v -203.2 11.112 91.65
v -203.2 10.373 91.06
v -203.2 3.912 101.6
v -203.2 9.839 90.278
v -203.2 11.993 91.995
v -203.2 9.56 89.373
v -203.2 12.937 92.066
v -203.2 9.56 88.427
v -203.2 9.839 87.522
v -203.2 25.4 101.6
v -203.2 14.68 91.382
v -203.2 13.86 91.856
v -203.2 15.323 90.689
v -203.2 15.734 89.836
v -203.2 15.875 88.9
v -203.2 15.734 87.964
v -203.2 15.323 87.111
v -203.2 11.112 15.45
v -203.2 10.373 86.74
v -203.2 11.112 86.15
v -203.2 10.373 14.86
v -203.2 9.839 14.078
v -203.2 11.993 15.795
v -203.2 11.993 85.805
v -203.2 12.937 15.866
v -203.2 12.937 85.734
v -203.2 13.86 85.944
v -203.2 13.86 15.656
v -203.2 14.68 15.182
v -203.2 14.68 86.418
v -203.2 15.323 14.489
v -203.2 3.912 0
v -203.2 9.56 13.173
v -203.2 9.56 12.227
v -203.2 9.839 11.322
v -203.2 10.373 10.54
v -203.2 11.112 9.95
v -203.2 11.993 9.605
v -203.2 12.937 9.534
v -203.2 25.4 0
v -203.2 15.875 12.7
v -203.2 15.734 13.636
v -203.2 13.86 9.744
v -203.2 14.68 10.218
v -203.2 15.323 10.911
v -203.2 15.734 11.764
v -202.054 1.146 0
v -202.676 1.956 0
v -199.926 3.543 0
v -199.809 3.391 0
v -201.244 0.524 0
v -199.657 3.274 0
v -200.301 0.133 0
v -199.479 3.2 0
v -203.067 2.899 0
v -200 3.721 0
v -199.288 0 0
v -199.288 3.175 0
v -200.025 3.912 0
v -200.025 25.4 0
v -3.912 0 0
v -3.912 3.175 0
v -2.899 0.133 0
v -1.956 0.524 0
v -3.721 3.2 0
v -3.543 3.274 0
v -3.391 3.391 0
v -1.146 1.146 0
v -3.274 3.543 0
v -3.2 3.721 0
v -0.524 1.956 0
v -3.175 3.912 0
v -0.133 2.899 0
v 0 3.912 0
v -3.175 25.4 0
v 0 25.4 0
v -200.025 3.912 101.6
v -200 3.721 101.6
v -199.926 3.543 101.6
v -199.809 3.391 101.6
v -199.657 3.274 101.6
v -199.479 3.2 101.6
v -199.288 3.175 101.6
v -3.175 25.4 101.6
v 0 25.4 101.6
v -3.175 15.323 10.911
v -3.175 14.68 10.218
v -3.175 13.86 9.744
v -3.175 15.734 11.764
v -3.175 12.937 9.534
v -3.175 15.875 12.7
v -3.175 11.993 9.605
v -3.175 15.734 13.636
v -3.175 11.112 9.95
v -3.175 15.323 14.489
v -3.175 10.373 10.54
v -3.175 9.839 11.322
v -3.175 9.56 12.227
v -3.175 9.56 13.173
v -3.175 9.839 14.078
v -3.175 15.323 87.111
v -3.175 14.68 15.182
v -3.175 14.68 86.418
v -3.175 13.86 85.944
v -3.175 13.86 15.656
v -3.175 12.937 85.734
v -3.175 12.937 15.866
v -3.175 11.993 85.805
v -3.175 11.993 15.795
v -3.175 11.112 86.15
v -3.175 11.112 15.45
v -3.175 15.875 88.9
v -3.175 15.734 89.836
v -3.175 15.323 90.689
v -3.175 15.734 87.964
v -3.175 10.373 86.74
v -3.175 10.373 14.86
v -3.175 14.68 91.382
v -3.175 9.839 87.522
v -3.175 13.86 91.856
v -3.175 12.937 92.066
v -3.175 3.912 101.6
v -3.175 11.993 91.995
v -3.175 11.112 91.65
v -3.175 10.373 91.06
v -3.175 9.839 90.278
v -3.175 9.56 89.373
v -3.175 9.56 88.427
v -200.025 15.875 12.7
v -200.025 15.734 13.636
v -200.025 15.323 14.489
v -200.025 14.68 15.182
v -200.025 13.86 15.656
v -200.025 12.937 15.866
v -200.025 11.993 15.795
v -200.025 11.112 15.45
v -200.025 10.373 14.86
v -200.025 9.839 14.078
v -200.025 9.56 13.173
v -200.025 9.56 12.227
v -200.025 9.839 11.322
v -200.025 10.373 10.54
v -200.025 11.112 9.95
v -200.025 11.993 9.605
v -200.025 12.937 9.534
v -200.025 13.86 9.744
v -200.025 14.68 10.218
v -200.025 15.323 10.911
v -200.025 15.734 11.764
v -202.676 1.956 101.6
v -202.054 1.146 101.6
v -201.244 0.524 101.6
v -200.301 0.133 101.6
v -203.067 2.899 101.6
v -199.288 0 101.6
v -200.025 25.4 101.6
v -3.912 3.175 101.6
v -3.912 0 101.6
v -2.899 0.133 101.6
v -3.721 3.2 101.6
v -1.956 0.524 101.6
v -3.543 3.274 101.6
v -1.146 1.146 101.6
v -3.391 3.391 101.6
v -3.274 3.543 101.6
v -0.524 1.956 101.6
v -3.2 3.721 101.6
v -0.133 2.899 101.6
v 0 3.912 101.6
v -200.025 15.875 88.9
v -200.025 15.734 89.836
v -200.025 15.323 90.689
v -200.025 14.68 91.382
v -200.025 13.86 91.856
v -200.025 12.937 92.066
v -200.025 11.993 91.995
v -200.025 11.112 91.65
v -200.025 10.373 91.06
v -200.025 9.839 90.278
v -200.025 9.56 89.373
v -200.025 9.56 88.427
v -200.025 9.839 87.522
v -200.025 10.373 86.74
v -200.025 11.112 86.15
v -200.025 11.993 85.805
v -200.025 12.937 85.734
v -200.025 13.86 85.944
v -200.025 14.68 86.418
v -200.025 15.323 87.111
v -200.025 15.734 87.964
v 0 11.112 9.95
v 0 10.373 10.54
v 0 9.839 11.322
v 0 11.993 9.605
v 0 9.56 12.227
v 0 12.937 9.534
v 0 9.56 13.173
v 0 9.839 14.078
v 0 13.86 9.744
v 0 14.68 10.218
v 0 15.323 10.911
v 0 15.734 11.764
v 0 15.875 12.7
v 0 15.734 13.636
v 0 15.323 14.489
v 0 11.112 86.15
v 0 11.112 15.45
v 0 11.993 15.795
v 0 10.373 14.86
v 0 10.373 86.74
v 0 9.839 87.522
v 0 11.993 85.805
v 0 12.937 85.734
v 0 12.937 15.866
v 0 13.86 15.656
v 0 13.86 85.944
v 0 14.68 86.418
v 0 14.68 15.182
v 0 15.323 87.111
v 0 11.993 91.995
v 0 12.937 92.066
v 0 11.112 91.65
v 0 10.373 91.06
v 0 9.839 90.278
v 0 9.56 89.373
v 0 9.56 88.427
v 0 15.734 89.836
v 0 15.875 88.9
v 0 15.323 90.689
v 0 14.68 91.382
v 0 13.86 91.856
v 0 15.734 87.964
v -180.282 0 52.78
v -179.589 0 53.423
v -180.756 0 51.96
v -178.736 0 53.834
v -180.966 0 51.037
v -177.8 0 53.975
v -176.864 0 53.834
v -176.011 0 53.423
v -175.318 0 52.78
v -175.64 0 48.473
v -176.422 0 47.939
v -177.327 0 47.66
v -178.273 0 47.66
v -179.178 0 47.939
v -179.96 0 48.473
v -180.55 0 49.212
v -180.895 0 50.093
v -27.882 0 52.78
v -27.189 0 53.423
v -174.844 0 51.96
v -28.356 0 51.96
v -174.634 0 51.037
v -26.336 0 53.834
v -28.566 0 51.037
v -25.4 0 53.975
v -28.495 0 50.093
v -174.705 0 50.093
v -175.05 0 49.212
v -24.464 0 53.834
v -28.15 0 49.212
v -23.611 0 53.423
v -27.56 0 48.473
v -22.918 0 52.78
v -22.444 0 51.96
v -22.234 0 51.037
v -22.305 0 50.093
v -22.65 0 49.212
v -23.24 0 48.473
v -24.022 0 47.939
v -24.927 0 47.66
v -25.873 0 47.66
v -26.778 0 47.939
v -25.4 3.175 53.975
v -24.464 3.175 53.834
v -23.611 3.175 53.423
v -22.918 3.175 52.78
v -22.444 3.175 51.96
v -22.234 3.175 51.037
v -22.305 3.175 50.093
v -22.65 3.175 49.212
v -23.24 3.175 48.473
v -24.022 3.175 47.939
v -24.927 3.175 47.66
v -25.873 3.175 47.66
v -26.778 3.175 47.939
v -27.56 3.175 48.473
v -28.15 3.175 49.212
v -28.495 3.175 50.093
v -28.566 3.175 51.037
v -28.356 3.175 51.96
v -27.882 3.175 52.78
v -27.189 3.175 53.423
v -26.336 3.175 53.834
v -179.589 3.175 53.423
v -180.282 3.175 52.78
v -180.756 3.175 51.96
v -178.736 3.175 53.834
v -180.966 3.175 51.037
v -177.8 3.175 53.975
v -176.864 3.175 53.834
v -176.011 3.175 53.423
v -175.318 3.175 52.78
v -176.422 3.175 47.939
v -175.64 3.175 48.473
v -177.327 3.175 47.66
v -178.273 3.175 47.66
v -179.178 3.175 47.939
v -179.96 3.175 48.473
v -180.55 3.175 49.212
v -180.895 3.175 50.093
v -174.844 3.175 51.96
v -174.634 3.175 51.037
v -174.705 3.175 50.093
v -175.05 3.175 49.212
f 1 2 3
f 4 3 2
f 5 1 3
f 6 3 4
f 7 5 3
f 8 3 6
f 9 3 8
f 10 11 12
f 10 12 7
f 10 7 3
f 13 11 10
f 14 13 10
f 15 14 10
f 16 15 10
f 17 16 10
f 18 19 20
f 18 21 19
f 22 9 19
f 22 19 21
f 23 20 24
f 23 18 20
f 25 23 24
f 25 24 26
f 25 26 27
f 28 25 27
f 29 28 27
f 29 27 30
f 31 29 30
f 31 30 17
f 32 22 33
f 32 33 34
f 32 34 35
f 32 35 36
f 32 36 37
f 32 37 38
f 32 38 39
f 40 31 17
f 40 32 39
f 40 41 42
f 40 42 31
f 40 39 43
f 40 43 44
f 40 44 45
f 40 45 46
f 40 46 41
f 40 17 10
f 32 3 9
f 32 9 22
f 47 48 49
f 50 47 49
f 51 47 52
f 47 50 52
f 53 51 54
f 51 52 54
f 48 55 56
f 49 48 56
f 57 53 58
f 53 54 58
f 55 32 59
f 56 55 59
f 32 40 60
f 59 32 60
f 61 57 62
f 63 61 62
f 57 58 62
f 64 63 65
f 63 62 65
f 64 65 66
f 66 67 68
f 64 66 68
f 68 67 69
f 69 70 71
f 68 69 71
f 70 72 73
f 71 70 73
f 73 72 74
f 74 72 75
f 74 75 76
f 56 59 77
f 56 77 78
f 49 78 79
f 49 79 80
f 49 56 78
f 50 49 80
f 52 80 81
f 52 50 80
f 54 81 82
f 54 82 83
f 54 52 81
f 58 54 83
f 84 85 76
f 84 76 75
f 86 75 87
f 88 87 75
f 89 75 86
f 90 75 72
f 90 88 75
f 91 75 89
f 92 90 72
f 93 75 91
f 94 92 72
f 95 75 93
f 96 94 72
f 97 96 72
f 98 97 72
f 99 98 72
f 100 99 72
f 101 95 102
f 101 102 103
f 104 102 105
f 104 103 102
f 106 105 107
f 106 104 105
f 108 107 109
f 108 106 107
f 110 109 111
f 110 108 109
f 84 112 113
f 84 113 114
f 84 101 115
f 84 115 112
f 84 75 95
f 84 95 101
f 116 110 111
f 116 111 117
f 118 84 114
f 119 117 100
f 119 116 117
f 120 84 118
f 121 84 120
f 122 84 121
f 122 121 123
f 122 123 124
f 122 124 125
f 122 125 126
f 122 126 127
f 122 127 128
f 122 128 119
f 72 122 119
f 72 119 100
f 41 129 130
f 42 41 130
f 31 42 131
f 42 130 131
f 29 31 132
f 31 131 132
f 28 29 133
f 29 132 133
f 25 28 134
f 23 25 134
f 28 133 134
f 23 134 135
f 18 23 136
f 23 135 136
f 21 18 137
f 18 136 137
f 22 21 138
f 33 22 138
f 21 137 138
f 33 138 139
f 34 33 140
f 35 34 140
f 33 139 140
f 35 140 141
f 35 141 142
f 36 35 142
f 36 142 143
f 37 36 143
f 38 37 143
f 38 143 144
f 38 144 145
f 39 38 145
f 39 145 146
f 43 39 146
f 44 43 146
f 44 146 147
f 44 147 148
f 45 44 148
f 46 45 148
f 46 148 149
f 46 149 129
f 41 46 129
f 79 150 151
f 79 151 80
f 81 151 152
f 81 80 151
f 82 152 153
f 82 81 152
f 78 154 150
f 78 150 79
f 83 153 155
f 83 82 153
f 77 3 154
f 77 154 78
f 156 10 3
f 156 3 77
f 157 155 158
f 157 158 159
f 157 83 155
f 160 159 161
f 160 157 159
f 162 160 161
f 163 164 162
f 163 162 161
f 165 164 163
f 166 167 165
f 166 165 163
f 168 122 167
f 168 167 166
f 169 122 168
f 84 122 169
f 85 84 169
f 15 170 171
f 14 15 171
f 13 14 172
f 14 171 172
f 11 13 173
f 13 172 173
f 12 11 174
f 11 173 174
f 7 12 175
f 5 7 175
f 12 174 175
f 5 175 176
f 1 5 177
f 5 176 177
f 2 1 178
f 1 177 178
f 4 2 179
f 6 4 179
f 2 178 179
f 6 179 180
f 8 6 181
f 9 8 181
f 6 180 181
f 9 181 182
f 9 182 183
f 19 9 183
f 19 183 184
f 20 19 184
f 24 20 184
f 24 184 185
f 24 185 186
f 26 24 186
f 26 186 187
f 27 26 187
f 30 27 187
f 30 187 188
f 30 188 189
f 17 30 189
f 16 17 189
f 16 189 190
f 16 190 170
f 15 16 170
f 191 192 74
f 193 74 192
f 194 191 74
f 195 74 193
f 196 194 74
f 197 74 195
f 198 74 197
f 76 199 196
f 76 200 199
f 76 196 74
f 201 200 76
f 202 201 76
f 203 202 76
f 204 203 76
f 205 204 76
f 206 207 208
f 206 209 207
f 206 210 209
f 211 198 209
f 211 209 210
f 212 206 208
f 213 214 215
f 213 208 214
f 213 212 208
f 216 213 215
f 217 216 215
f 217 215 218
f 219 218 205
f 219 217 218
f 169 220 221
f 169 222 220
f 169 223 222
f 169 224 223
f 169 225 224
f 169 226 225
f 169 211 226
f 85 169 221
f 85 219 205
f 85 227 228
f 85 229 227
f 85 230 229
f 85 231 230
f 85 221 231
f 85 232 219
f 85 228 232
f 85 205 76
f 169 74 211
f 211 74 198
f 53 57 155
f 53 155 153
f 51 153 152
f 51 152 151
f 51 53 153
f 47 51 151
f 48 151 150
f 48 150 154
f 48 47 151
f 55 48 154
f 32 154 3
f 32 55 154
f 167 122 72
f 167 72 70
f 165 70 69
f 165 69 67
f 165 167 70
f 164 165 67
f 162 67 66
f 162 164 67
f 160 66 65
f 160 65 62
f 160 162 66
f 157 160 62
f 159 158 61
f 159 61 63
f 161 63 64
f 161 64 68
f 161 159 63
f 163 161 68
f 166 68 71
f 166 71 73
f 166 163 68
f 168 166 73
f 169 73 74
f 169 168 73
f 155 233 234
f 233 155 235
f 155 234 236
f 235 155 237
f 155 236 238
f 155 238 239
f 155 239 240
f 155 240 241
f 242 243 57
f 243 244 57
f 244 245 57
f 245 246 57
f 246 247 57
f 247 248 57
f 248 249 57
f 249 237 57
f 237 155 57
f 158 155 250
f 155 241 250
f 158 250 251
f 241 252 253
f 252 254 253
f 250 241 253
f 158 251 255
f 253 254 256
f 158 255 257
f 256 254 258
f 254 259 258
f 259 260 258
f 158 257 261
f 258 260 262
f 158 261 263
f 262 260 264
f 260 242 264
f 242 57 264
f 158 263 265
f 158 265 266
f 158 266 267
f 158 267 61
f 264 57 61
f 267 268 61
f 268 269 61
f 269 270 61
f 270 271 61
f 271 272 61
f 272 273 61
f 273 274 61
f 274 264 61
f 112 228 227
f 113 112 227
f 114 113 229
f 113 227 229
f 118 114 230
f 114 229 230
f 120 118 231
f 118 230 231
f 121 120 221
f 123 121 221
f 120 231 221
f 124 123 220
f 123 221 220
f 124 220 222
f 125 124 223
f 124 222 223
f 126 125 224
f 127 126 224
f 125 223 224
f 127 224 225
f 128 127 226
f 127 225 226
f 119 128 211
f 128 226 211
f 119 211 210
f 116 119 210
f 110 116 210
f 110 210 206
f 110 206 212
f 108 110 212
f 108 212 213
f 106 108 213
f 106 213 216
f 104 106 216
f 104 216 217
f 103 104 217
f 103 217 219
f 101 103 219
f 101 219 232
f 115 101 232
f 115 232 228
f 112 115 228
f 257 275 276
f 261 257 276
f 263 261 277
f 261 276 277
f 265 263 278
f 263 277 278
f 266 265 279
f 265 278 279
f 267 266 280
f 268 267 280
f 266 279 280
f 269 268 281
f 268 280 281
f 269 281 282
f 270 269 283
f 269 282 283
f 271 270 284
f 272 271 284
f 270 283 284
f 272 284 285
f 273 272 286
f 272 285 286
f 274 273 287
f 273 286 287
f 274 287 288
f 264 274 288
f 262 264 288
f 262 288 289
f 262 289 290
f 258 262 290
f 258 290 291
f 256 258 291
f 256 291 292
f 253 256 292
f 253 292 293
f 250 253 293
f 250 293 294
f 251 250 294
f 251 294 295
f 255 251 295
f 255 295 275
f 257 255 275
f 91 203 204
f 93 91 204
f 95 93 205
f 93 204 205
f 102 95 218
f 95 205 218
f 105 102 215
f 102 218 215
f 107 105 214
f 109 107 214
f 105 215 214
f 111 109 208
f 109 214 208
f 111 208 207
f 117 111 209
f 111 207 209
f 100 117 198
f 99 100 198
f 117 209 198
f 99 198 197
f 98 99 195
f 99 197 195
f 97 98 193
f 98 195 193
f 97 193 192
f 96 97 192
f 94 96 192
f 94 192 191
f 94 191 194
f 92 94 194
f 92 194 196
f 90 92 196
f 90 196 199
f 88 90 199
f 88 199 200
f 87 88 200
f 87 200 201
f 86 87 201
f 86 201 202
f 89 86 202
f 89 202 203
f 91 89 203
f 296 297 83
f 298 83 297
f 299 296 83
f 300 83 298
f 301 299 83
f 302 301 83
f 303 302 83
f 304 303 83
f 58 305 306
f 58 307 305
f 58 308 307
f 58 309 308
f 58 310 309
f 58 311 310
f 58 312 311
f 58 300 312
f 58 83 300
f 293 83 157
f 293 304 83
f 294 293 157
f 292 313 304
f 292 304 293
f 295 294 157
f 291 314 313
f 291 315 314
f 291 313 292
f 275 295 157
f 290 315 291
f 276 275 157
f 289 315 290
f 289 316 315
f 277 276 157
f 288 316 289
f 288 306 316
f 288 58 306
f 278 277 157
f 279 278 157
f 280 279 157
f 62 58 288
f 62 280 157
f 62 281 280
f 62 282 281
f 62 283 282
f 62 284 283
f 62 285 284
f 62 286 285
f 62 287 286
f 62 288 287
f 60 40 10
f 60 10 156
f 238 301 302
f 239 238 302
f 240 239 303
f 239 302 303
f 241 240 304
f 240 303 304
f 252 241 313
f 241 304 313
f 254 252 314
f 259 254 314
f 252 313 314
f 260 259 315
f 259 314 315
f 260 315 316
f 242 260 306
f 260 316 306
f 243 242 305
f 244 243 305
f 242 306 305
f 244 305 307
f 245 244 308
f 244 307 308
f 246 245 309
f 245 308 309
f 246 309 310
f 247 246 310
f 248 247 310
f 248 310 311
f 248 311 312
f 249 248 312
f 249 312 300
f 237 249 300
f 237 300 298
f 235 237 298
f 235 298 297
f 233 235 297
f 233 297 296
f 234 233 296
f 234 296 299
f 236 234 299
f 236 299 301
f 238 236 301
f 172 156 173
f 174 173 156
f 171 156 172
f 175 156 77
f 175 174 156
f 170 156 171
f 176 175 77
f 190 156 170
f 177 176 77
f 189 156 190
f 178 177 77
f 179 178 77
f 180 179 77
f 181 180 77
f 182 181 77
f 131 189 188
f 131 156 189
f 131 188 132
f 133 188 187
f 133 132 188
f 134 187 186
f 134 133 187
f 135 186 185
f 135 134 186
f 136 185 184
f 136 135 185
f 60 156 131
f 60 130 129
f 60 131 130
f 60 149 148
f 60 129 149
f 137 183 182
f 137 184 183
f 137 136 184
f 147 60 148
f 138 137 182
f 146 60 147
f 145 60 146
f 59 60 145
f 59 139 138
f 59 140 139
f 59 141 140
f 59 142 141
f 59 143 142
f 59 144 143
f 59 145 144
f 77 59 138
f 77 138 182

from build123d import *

# Parameters (mm, degrees)
BASE_FLANGE1_OUTLINE_W       = 203.2
BASE_FLANGE1_OUTLINE_H       = 3.175
BASE_FLANGE1_DEPTH           = 101.6
EDGE_FLANGE1_STRIP_W         = 14.1732
EDGE_FLANGE1_STRIP_H         = 3.175
EDGE_FLANGE1_STRIP_CUT_DEPTH = 101.6
EDGE_FLANGE1_DEPTH           = 101.6
EDGE_FLANGE2_STRIP_W         = 14.1732
EDGE_FLANGE2_STRIP_H         = 3.175
EDGE_FLANGE2_STRIP_CUT_DEPTH = 101.6
EDGE_FLANGE2_DEPTH           = 101.6
SKETCH38_R                   = 3.175
CUT_EXTRUDE2_DEPTH           = 229.6
SKETCH45_R                   = 3.175
CUT_EXTRUDE3_DEPTH           = 12.7


# Read off the part's stored shape, not the designer's step: Base-Flange1
# Sheet-metal steps are written as plain solids
with BuildPart() as part:
    # Base-Flange1 outline → Base-Flange1 (new body)
    with BuildSketch(Plane.XY):
        with Locations((-101.6, 1.5875)):
            Rectangle(BASE_FLANGE1_OUTLINE_W, BASE_FLANGE1_OUTLINE_H)
    extrude(amount=BASE_FLANGE1_DEPTH)

    # Edge-Flange1 strip (across the edge) → Edge-Flange1 strip cut (cut)
    with BuildSketch(Plane(origin=(-203.2, 3.175, 0), x_dir=(1, 0, 0), z_dir=(0, 0, 1))):
        with Locations((-3.175, -1.5875)):
            Rectangle(EDGE_FLANGE1_STRIP_W, EDGE_FLANGE1_STRIP_H)
    extrude(amount=EDGE_FLANGE1_STRIP_CUT_DEPTH, mode=Mode.SUBTRACT)

    # Edge-Flange1 section (across the edge) → Edge-Flange1 (add)
    with BuildSketch(Plane(origin=(-203.2, 3.175, 0), x_dir=(1, 0, 0), z_dir=(0, 0, 1))):
        with BuildLine():
            Line((0, 0.7366), (0, 22.225))
            Line((0, 22.225), (3.175, 22.225))
            Line((3.175, 22.225), (3.175, 0.7366))
            ThreePointArc((3.175, 0.7366), (3.390745145, 0.215745145), (3.9116, 0))
            Line((3.9116, 0), (3.9116, -3.175))
            ThreePointArc((3.9116, -3.175), (1.145681115, -2.029318885), (0, 0.7366))
        make_face()
    extrude(amount=EDGE_FLANGE1_DEPTH)

    # Edge-Flange2 strip (across the edge) → Edge-Flange2 strip cut (cut)
    with BuildSketch(Plane(origin=(0, 3.175, 101.6), x_dir=(-1, 0, 0), z_dir=(0, 0, -1))):
        with Locations((-3.175, -1.5875)):
            Rectangle(EDGE_FLANGE2_STRIP_W, EDGE_FLANGE2_STRIP_H)
    extrude(amount=EDGE_FLANGE2_STRIP_CUT_DEPTH, mode=Mode.SUBTRACT)

    # Edge-Flange2 section (across the edge) → Edge-Flange2 (add)
    with BuildSketch(Plane(origin=(0, 3.175, 101.6), x_dir=(-1, 0, 0), z_dir=(0, 0, -1))):
        with BuildLine():
            Line((0, 0.7366), (0, 22.225))
            Line((0, 22.225), (3.175, 22.225))
            Line((3.175, 22.225), (3.175, 0.7366))
            ThreePointArc((3.175, 0.7366), (3.390745145, 0.215745145), (3.9116, 0))
            Line((3.9116, 0), (3.9116, -3.175))
            ThreePointArc((3.9116, -3.175), (1.145681115, -2.029318885), (0, 0.7366))
        make_face()
    extrude(amount=EDGE_FLANGE2_DEPTH)

    # Sketch38 → Cut-Extrude2 (cut, through all)
    with BuildSketch(Plane(origin=(0, 0, 0), x_dir=(0, 0, -1), z_dir=(1, 0, 0))):
        with Locations(Location((-12.7, 12.7, 0), (0, 0, 90))):
            Circle(SKETCH38_R)
        with Locations(Location((-88.9, 12.7, 0), (0, 0, 90))):
            Circle(SKETCH38_R)
    extrude(amount=-CUT_EXTRUDE2_DEPTH, mode=Mode.SUBTRACT)

    # Sketch45 → Cut-Extrude3 (cut)
    with BuildSketch(Plane(origin=(0, 3.175, 0), x_dir=(1, 0, 0), z_dir=(0, 1, 0))):
        with Locations(Location((-177.8, -50.8, 0), (0, 0, 270))):
            Circle(SKETCH45_R)
        with Locations(Location((-25.4, -50.8, 0), (0, 0, 270))):
            Circle(SKETCH45_R)
    extrude(amount=-CUT_EXTRUDE3_DEPTH, mode=Mode.SUBTRACT)


solid = part.part
